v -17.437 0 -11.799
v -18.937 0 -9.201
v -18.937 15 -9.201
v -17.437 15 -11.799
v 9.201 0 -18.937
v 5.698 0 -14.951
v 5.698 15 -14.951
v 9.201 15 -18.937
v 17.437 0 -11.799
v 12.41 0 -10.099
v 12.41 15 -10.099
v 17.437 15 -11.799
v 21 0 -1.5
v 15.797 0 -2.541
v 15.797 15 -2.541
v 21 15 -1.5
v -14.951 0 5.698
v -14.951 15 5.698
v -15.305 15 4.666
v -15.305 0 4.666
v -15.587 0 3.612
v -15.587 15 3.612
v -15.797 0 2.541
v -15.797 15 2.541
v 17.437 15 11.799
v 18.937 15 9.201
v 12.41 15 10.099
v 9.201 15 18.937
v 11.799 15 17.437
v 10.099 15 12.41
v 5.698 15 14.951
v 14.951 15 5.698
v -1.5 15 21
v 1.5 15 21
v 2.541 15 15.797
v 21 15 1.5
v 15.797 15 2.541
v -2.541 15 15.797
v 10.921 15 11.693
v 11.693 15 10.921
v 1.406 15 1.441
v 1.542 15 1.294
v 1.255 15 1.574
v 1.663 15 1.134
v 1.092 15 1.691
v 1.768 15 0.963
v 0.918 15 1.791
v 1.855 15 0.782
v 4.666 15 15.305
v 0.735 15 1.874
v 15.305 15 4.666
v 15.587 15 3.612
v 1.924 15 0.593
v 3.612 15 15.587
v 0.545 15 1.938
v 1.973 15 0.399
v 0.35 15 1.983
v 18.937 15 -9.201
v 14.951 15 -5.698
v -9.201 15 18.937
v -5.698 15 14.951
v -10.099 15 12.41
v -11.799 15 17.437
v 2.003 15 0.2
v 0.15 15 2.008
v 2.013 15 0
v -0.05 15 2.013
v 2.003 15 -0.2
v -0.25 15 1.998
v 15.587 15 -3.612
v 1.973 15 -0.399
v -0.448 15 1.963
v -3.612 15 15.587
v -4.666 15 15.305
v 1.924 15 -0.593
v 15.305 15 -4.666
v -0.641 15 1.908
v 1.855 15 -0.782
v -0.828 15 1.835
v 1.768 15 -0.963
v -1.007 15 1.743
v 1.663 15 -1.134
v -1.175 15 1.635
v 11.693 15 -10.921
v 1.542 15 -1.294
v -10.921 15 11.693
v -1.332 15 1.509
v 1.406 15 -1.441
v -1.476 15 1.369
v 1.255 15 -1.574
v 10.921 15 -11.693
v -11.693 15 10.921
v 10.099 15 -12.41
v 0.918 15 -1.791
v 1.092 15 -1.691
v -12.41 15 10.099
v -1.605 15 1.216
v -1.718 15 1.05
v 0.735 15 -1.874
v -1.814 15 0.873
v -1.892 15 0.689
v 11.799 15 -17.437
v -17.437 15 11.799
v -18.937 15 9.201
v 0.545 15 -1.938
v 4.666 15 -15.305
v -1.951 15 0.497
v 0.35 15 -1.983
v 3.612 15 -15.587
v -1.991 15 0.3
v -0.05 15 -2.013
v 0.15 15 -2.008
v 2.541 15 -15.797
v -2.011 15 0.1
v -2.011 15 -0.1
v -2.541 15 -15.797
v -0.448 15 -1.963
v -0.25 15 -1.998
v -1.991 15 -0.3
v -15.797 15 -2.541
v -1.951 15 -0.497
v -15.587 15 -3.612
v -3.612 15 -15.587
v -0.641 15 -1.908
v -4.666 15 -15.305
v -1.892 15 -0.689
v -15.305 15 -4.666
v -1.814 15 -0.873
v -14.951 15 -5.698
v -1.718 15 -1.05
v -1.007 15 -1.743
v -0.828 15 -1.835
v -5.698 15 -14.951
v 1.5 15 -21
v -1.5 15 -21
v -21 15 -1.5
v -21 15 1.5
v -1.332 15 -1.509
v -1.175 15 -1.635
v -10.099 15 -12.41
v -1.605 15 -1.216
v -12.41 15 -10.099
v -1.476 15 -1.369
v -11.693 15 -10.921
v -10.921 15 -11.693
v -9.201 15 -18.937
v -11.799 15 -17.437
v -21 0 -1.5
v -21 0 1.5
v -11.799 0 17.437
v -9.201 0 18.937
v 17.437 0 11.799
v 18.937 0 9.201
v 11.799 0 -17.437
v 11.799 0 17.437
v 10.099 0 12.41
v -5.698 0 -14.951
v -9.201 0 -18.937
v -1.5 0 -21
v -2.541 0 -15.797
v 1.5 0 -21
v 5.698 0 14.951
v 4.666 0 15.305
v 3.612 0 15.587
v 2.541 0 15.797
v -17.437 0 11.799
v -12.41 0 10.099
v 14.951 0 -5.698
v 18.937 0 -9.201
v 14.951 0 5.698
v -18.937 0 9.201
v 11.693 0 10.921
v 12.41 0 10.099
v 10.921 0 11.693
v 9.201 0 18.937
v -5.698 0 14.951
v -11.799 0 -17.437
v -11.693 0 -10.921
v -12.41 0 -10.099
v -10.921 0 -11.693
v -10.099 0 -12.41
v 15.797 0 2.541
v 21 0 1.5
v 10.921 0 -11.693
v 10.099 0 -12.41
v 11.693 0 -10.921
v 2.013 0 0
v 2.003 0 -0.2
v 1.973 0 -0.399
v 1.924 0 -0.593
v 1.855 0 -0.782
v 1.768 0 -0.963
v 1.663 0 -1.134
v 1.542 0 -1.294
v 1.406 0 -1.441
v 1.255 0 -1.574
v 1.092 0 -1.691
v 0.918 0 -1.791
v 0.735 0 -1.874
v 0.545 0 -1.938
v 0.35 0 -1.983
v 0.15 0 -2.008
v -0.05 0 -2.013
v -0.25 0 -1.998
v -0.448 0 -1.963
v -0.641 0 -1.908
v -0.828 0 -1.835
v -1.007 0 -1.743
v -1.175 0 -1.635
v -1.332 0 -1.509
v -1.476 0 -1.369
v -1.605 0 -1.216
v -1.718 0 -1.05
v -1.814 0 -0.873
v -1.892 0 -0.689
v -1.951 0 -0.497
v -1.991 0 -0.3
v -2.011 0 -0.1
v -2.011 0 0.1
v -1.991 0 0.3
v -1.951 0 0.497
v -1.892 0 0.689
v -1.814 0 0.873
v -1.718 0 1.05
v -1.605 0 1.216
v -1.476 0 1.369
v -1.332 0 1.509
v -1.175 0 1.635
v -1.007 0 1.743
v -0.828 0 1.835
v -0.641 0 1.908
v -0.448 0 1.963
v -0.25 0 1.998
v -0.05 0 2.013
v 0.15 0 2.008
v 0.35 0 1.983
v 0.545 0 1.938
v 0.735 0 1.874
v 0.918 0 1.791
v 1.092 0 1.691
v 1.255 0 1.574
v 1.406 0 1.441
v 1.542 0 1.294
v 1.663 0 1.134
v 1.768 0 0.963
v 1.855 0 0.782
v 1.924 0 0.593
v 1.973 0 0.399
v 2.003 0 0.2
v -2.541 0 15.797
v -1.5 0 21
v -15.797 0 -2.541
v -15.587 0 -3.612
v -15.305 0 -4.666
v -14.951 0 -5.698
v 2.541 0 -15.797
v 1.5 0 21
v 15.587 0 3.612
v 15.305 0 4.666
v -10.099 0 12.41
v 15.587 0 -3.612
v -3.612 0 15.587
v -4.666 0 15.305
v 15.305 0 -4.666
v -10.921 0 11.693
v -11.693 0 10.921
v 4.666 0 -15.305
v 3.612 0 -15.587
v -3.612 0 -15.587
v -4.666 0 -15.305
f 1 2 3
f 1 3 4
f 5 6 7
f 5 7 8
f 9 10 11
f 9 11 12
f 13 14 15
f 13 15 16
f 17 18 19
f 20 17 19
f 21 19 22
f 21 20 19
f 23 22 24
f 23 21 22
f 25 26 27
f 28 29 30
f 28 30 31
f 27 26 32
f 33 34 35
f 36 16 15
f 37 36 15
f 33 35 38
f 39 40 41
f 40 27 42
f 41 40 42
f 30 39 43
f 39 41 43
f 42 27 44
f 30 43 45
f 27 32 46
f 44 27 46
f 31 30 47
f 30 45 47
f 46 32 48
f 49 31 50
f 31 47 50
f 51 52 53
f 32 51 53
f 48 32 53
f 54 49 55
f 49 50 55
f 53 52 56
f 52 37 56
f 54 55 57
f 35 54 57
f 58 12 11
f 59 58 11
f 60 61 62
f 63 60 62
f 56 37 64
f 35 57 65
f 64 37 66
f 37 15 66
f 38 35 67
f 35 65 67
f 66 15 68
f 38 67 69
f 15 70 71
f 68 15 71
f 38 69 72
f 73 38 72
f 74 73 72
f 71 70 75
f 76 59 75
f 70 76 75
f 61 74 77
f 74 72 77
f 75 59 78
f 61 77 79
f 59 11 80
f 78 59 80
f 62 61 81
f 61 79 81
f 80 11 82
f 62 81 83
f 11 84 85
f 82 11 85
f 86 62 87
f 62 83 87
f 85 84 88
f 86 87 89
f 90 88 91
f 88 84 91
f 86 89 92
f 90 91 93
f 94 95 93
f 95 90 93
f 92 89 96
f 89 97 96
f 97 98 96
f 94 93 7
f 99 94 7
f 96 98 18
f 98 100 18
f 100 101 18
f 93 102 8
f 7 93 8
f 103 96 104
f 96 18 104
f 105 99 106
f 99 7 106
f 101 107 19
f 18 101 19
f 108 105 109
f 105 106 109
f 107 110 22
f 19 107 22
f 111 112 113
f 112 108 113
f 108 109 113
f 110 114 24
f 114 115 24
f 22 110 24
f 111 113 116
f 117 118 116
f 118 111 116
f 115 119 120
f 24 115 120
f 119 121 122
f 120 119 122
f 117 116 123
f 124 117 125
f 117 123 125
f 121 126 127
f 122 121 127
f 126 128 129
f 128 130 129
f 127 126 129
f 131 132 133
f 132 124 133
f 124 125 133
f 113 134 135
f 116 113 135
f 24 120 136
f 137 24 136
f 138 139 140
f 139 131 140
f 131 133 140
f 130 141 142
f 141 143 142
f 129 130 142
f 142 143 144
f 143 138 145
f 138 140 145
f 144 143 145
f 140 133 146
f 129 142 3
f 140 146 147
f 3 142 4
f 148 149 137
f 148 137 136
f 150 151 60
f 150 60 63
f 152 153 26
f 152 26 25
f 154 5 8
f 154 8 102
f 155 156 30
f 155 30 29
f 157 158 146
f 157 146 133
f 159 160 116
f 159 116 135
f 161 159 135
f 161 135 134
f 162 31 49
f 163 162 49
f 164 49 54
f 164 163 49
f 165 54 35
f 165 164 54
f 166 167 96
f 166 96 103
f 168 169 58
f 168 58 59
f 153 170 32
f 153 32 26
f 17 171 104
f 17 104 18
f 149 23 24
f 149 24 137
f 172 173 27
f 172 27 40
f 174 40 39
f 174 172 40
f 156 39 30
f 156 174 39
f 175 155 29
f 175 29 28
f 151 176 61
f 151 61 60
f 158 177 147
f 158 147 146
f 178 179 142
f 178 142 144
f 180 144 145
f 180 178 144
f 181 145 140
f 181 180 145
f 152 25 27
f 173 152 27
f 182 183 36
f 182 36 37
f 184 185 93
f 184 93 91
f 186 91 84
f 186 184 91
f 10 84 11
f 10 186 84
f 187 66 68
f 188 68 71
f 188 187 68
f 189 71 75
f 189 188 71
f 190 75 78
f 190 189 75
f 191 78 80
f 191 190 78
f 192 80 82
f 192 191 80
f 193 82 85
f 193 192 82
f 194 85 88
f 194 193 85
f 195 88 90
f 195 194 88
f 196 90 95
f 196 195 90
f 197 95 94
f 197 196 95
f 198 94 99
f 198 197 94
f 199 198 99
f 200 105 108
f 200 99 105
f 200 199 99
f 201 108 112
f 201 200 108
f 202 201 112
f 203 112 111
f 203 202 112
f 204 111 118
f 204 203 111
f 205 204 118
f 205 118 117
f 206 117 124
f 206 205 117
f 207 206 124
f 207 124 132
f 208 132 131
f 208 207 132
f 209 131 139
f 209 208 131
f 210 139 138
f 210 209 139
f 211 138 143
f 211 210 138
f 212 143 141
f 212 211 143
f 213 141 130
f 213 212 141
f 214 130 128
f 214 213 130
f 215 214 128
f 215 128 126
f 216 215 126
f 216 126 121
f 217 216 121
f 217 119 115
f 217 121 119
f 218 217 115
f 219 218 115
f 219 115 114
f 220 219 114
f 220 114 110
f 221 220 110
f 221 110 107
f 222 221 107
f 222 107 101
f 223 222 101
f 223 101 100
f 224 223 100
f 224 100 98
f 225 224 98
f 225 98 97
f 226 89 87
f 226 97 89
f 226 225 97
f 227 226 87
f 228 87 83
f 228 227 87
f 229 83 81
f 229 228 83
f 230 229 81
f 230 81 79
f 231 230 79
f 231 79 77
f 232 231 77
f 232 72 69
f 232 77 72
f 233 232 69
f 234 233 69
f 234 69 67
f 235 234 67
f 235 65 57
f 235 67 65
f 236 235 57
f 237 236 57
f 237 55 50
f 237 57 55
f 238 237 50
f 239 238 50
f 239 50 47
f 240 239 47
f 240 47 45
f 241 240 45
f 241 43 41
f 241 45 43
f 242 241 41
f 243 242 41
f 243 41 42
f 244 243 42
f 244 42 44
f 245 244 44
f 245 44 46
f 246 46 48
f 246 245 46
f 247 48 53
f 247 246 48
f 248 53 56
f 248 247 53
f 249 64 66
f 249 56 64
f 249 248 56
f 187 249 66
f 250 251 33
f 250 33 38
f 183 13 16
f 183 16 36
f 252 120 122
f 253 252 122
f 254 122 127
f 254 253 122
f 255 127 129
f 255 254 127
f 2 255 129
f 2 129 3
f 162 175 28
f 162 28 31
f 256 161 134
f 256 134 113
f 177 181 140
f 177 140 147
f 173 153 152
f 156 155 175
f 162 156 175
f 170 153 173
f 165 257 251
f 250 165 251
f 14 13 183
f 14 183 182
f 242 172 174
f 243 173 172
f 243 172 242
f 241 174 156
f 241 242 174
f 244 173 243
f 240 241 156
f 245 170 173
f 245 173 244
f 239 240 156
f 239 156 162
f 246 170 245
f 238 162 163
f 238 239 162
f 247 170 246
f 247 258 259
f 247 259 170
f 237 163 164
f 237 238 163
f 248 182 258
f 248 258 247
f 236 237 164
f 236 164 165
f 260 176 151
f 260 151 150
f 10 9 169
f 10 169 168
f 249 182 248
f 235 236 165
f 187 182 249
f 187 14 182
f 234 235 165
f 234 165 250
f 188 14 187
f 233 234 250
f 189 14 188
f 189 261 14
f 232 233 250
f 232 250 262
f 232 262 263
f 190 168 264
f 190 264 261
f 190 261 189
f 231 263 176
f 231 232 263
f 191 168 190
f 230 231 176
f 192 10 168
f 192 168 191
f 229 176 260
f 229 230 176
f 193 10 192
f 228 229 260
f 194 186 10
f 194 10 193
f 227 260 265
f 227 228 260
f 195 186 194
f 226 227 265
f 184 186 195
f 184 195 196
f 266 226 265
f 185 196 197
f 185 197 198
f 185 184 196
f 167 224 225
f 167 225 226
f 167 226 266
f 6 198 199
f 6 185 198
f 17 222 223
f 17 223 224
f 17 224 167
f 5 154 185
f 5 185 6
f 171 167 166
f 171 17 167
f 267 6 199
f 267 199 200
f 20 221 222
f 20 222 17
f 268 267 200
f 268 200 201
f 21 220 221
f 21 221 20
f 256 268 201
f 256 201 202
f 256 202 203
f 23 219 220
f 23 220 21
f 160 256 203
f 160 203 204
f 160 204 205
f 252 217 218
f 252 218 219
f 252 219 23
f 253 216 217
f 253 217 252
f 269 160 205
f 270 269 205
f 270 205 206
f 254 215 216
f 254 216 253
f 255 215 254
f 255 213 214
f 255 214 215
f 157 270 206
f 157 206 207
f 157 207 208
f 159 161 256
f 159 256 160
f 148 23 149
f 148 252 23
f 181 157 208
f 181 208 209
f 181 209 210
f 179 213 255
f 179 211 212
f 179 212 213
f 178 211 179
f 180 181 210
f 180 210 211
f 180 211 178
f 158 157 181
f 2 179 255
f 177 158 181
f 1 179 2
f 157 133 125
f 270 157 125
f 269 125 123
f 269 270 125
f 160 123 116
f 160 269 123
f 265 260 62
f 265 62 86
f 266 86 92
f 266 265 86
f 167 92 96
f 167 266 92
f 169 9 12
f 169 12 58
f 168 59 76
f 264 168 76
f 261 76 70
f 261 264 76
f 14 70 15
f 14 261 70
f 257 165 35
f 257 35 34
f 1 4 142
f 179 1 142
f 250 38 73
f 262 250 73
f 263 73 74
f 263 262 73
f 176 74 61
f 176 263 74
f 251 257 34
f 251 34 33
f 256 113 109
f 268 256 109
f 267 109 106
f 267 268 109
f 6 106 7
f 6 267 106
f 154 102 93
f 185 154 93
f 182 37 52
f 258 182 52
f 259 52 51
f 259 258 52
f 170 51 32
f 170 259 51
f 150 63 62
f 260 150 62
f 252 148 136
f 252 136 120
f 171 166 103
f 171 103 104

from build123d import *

# Parameters (mm, degrees)
BOSS_EXTRUDE1_DEPTH = 15
CUT_EXTRUDE1_REACH  = 17
SKETCH2_R           = 2.013136899


with BuildPart() as part:
    # Sketch1 → Boss-Extrude1 (new body)
    with BuildSketch(Plane(origin=(0, 0, 0), x_dir=(1, 0, 0), z_dir=(0, 1, 0))):
        with BuildLine():
            Line((-2.540599067, 15.797004665), (-1.5, 21))
            Line((-1.5, 21), (1.5, 21))
            Line((1.5, 21), (2.540599067, 15.797004665))
            ThreePointArc((2.540599067, 15.797004665), (4.141104722, 15.454813221), (5.698279, 14.950906877))
            Line((5.698279, 14.950906877), (9.200961894, 18.936533479))
            Line((9.200961894, 18.936533479), (11.799038106, 17.436533479))
            Line((11.799038106, 17.436533479), (10.098725665, 12.41030781))
            ThreePointArc((10.098725665, 12.41030781), (11.313708499, 11.313708499), (12.41030781, 10.098725665))
            Line((12.41030781, 10.098725665), (17.436533479, 11.799038106))
            Line((17.436533479, 11.799038106), (18.936533479, 9.200961894))
            Line((18.936533479, 9.200961894), (14.950906877, 5.698279))
            ThreePointArc((14.950906877, 5.698279), (15.454813221, 4.141104722), (15.797004665, 2.540599067))
            Line((15.797004665, 2.540599067), (21, 1.5))
            Line((21, 1.5), (21, -1.5))
            Line((21, -1.5), (15.797004665, -2.540599067))
            ThreePointArc((15.797004665, -2.540599067), (15.454813221, -4.141104722), (14.950906877, -5.698279))
            Line((14.950906877, -5.698279), (18.936533479, -9.200961894))
            Line((18.936533479, -9.200961894), (17.436533479, -11.799038106))
            Line((17.436533479, -11.799038106), (12.41030781, -10.098725665))
            ThreePointArc((12.41030781, -10.098725665), (11.313708499, -11.313708499), (10.098725665, -12.41030781))
            Line((10.098725665, -12.41030781), (11.799038106, -17.436533479))
            Line((11.799038106, -17.436533479), (9.200961894, -18.936533479))
            Line((9.200961894, -18.936533479), (5.698279, -14.950906877))
            ThreePointArc((5.698279, -14.950906877), (4.141104722, -15.454813221), (2.540599067, -15.797004665))
            Line((2.540599067, -15.797004665), (1.5, -21))
            Line((1.5, -21), (-1.5, -21))
            Line((-1.5, -21), (-2.540599067, -15.797004665))
            ThreePointArc((-2.540599067, -15.797004665), (-4.141104722, -15.454813221), (-5.698279, -14.950906877))
            Line((-5.698279, -14.950906877), (-9.200961894, -18.936533479))
            Line((-9.200961894, -18.936533479), (-11.799038106, -17.436533479))
            Line((-11.799038106, -17.436533479), (-10.098725665, -12.41030781))
            ThreePointArc((-10.098725665, -12.41030781), (-11.313708499, -11.313708499), (-12.41030781, -10.098725665))
            Line((-12.41030781, -10.098725665), (-17.436533479, -11.799038106))
            Line((-17.436533479, -11.799038106), (-18.936533479, -9.200961894))
            Line((-18.936533479, -9.200961894), (-14.950906877, -5.698279))
            ThreePointArc((-14.950906877, -5.698279), (-15.454813221, -4.141104722), (-15.797004665, -2.540599067))
            Line((-15.797004665, -2.540599067), (-21, -1.5))
            Line((-21, -1.5), (-21, 1.5))
            Line((-21, 1.5), (-15.797004665, 2.540599067))
            ThreePointArc((-15.797004665, 2.540599067), (-15.454813221, 4.141104722), (-14.950906877, 5.698279))
            Line((-14.950906877, 5.698279), (-18.936533479, 9.200961894))
            Line((-18.936533479, 9.200961894), (-17.436533479, 11.799038106))
            Line((-17.436533479, 11.799038106), (-12.41030781, 10.098725665))
            ThreePointArc((-12.41030781, 10.098725665), (-11.313708499, 11.313708499), (-10.098725665, 12.41030781))
            Line((-10.098725665, 12.41030781), (-11.799038106, 17.436533479))
            Line((-11.799038106, 17.436533479), (-9.200961894, 18.936533479))
            Line((-9.200961894, 18.936533479), (-5.698279, 14.950906877))
            ThreePointArc((-5.698279, 14.950906877), (-4.141104722, 15.454813221), (-2.540599067, 15.797004665))
        make_face()
    extrude(amount=BOSS_EXTRUDE1_DEPTH)

    # Sketch2 → Cut-Extrude1 (cut, up to next)
    with BuildSketch(Plane(origin=(0, 0, 0), x_dir=(1, 0, 0), z_dir=(0, 1, 0)), mode=Mode.PRIVATE) as cut_extrude1_sk1:
        Circle(SKETCH2_R)
    cut_extrude1_tool1 = extrude(cut_extrude1_sk1.sketch, amount=CUT_EXTRUDE1_REACH, mode=Mode.PRIVATE) & part.part
    add(cut_extrude1_tool1.solids().sort_by_distance((0, 0, 0))[0], mode=Mode.SUBTRACT)


solid = part.part
